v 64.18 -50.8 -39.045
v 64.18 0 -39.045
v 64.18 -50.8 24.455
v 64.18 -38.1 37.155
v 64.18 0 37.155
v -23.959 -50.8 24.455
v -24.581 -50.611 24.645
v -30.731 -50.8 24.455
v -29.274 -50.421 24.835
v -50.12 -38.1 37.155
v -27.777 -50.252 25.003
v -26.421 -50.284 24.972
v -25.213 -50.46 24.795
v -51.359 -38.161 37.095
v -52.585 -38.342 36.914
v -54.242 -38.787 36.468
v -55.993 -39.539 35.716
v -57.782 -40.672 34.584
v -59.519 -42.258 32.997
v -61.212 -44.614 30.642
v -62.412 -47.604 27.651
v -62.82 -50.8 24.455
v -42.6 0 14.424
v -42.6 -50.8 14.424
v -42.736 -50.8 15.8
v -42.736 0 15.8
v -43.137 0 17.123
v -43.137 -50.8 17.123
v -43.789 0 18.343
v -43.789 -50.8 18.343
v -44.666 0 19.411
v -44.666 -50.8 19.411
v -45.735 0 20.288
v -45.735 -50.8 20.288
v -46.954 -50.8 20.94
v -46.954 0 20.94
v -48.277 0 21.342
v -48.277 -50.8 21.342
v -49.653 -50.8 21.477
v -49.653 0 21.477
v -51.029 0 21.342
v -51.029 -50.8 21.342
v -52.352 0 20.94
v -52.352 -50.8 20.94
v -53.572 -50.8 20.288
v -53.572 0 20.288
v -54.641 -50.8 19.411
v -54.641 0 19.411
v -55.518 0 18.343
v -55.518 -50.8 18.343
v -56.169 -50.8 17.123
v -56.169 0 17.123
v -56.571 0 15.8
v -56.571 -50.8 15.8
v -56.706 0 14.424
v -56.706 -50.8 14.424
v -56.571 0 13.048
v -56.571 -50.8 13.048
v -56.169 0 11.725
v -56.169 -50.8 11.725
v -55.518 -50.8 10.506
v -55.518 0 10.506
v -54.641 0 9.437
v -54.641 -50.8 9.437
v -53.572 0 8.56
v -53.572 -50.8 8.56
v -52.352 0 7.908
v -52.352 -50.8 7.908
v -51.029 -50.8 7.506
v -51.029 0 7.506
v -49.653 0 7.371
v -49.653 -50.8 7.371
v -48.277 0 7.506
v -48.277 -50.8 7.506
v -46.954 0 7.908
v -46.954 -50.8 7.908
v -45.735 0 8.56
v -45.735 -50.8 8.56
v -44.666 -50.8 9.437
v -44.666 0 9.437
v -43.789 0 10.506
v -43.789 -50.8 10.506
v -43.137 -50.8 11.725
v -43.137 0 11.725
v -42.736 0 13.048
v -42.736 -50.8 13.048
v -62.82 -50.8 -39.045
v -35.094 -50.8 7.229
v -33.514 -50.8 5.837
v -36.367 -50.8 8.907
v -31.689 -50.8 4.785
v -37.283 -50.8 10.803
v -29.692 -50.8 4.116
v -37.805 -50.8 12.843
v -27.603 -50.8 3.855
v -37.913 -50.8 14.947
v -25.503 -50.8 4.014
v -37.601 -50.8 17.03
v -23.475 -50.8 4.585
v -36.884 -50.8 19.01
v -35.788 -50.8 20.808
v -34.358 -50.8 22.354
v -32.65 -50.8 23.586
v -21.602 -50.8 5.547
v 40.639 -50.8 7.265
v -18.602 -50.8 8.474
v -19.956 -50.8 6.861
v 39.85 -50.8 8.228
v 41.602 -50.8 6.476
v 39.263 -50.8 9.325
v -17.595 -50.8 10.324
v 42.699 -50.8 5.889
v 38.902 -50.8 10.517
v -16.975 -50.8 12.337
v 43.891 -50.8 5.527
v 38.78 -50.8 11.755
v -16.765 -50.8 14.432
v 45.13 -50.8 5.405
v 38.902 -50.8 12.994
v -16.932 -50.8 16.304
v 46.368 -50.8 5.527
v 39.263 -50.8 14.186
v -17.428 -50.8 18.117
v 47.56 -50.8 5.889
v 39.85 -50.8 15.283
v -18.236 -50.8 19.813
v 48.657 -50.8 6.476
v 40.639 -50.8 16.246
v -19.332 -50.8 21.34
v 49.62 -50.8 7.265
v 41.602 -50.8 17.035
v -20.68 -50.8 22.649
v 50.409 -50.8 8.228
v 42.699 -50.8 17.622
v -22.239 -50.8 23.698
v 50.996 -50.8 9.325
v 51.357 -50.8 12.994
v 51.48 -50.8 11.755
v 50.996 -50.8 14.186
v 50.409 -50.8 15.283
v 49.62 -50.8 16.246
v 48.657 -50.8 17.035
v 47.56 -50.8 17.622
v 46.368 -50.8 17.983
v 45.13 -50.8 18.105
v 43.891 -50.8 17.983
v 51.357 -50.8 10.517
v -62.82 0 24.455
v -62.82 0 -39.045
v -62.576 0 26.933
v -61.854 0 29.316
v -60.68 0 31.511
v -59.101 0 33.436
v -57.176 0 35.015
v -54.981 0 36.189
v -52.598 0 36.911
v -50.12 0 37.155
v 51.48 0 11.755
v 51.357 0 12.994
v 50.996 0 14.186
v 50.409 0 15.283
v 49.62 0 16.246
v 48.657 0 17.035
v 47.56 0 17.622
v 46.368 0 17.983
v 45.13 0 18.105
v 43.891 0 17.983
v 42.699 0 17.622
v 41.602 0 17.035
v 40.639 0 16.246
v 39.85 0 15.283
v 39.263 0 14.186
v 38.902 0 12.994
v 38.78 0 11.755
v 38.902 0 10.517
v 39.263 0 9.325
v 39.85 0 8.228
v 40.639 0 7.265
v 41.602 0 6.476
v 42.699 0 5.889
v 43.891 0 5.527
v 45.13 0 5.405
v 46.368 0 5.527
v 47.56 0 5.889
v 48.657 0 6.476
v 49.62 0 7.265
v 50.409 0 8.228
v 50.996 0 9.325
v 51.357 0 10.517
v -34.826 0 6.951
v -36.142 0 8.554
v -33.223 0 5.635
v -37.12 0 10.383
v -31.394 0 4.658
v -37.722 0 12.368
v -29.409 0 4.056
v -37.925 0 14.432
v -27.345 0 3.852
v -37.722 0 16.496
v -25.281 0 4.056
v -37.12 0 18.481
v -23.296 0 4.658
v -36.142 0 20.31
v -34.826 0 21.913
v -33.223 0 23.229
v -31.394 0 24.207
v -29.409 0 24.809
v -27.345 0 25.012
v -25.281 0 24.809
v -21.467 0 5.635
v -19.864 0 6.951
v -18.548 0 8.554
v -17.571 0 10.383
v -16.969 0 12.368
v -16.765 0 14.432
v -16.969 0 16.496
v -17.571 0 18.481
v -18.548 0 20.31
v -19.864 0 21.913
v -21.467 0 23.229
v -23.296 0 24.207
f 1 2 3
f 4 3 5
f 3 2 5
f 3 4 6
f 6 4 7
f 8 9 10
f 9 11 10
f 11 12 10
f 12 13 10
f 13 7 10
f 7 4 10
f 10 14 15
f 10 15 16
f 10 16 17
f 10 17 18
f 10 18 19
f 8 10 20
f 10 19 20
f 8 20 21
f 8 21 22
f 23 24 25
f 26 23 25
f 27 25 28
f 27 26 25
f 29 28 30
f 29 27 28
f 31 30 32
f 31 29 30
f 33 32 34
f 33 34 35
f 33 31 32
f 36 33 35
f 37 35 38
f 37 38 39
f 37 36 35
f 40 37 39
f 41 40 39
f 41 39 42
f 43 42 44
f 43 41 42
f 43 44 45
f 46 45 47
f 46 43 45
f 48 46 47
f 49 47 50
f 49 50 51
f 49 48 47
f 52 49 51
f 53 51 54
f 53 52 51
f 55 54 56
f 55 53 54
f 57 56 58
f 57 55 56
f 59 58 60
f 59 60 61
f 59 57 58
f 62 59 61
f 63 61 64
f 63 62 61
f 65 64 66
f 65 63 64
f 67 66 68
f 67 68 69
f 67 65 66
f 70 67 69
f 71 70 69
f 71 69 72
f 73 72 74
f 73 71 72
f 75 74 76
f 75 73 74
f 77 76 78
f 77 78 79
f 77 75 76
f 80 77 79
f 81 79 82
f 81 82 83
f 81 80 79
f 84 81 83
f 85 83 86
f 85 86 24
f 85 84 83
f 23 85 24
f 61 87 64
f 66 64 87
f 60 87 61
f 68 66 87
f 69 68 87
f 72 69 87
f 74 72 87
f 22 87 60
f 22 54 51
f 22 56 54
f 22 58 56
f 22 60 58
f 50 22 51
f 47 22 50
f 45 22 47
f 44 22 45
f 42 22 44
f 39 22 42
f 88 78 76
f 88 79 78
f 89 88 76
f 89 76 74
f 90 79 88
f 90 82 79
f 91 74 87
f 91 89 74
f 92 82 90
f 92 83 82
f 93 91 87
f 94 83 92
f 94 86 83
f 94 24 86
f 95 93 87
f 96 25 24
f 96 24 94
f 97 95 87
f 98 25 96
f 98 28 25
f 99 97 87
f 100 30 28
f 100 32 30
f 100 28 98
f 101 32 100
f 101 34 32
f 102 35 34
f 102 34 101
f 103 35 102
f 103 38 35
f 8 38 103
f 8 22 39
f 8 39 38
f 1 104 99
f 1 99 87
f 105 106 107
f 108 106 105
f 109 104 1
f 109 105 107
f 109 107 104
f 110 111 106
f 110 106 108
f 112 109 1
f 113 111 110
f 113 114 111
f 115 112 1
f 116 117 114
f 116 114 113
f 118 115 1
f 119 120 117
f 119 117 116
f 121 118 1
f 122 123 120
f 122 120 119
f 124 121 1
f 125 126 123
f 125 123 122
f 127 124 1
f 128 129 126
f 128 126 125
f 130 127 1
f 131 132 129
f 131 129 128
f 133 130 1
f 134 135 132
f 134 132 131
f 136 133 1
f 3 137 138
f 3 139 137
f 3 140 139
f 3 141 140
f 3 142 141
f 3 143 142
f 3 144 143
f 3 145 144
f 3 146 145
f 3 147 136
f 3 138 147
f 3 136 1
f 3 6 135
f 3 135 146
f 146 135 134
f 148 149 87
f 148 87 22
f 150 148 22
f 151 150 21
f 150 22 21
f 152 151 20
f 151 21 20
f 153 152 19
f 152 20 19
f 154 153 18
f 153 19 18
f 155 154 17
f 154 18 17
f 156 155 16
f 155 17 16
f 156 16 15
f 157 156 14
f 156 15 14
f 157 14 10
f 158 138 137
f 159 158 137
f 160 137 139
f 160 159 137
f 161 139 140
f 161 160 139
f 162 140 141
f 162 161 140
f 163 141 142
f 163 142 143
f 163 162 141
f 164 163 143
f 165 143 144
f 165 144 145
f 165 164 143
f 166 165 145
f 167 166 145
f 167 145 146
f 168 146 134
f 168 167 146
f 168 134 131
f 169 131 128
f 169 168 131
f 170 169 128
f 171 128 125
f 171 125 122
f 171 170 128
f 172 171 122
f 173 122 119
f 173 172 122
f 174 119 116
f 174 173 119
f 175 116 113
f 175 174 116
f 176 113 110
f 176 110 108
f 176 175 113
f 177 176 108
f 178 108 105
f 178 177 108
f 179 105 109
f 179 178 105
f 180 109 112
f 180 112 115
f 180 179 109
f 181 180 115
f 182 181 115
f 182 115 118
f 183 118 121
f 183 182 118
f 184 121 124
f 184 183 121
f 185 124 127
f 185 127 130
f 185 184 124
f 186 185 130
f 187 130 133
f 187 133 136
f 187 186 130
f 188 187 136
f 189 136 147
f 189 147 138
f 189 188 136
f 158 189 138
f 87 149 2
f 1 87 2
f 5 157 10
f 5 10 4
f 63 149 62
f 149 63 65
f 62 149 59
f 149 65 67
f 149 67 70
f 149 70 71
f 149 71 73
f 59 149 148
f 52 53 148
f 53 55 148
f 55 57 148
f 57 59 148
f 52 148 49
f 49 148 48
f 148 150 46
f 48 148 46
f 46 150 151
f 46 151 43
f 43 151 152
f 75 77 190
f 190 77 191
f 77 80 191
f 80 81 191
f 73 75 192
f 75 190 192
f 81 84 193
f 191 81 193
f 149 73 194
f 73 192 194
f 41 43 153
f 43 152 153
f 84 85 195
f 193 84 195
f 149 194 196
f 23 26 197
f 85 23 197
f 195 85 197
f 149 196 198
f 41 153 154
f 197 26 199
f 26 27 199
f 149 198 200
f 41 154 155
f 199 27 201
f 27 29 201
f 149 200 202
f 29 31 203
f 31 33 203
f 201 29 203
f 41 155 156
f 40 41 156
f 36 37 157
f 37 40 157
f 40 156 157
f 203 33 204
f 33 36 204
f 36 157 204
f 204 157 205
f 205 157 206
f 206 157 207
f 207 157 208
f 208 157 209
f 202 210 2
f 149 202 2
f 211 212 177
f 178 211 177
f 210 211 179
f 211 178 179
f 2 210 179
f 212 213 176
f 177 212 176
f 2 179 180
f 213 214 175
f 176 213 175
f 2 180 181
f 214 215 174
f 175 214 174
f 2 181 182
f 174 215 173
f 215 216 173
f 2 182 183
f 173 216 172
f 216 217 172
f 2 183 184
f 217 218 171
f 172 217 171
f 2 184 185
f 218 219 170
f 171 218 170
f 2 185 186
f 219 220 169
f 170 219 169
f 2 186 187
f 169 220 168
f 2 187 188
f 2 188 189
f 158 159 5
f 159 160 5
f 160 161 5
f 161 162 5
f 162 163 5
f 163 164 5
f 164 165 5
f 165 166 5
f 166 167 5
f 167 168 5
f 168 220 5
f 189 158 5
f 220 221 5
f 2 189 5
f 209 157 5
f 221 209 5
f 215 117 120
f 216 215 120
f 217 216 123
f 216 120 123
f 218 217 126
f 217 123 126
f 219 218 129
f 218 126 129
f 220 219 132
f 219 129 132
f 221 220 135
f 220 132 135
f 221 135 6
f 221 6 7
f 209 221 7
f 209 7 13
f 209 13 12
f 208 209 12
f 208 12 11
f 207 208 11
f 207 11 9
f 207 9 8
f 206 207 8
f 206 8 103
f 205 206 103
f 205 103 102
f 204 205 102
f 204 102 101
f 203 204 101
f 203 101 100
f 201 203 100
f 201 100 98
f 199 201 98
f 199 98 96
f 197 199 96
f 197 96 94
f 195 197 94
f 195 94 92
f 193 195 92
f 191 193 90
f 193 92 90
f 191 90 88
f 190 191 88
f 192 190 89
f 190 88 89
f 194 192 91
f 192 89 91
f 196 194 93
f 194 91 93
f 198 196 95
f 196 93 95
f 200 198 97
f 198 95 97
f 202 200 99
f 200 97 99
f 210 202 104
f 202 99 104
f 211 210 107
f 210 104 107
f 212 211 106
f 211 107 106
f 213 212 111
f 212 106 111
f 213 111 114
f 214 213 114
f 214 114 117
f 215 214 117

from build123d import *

# Parameters (mm, degrees)
F0_W        = 127
F0_H        = 76.2
F0_R        = 7.0531122836
F0_R_2      = 6.35
F1_DEPTH    = 50.8
F2_R        = 10.5798439837
F3_DEPTH    = 86.868
F4_T1_DEPTH = 192.3207478943
F5_R        = 12.7


# Not quite as in the source:
# - a fillet or chamfer that OpenCascade refuses, or shapes differently, is made with other operations: its cross-section is extruded or revolved along the edge and cut away or added


with BuildPart() as f1:
    # F0 (on Front) → F1 (new body)
    with BuildSketch(Plane.XZ):
        with Locations((0.679500401, -0.9445134997)):
            Rectangle(F0_W, F0_H)
        with Locations((-49.6532134712, 14.4240399823)):
            Circle(F0_R, mode=Mode.SUBTRACT)
        with Locations((45.129500401, 11.7554865003)):
            Circle(F0_R_2, mode=Mode.SUBTRACT)
    extrude(amount=F1_DEPTH)

    # F2 (on face) → F3 (cut)
    with BuildSketch(Plane.XZ.offset(50.8)):
        with Locations((-27.3451898247, 14.4321834669)):
            Circle(F2_R)
    extrude(amount=-F3_DEPTH, mode=Mode.SUBTRACT)

    # F4: chamfer of 12.7 on 1 edges, made by hand

    # F4_s2 → F4_t1 (cut)
    with BuildSketch(Plane.YZ.offset(-95.4808735461)):
        Polygon((-38.1, 37.1554865003), (-50.8, 24.4554865003), (-50.8, 37.1554865003), align=None)
    extrude(amount=F4_T1_DEPTH, mode=Mode.SUBTRACT)

    # F5
    f5_edges = [f1.edges().sort_by_distance(p)[0] for p in [
        (-62.8205, -19.05, 37.155487),
    ]]
    fillet(f5_edges, radius=F5_R)


solid = f1.part
